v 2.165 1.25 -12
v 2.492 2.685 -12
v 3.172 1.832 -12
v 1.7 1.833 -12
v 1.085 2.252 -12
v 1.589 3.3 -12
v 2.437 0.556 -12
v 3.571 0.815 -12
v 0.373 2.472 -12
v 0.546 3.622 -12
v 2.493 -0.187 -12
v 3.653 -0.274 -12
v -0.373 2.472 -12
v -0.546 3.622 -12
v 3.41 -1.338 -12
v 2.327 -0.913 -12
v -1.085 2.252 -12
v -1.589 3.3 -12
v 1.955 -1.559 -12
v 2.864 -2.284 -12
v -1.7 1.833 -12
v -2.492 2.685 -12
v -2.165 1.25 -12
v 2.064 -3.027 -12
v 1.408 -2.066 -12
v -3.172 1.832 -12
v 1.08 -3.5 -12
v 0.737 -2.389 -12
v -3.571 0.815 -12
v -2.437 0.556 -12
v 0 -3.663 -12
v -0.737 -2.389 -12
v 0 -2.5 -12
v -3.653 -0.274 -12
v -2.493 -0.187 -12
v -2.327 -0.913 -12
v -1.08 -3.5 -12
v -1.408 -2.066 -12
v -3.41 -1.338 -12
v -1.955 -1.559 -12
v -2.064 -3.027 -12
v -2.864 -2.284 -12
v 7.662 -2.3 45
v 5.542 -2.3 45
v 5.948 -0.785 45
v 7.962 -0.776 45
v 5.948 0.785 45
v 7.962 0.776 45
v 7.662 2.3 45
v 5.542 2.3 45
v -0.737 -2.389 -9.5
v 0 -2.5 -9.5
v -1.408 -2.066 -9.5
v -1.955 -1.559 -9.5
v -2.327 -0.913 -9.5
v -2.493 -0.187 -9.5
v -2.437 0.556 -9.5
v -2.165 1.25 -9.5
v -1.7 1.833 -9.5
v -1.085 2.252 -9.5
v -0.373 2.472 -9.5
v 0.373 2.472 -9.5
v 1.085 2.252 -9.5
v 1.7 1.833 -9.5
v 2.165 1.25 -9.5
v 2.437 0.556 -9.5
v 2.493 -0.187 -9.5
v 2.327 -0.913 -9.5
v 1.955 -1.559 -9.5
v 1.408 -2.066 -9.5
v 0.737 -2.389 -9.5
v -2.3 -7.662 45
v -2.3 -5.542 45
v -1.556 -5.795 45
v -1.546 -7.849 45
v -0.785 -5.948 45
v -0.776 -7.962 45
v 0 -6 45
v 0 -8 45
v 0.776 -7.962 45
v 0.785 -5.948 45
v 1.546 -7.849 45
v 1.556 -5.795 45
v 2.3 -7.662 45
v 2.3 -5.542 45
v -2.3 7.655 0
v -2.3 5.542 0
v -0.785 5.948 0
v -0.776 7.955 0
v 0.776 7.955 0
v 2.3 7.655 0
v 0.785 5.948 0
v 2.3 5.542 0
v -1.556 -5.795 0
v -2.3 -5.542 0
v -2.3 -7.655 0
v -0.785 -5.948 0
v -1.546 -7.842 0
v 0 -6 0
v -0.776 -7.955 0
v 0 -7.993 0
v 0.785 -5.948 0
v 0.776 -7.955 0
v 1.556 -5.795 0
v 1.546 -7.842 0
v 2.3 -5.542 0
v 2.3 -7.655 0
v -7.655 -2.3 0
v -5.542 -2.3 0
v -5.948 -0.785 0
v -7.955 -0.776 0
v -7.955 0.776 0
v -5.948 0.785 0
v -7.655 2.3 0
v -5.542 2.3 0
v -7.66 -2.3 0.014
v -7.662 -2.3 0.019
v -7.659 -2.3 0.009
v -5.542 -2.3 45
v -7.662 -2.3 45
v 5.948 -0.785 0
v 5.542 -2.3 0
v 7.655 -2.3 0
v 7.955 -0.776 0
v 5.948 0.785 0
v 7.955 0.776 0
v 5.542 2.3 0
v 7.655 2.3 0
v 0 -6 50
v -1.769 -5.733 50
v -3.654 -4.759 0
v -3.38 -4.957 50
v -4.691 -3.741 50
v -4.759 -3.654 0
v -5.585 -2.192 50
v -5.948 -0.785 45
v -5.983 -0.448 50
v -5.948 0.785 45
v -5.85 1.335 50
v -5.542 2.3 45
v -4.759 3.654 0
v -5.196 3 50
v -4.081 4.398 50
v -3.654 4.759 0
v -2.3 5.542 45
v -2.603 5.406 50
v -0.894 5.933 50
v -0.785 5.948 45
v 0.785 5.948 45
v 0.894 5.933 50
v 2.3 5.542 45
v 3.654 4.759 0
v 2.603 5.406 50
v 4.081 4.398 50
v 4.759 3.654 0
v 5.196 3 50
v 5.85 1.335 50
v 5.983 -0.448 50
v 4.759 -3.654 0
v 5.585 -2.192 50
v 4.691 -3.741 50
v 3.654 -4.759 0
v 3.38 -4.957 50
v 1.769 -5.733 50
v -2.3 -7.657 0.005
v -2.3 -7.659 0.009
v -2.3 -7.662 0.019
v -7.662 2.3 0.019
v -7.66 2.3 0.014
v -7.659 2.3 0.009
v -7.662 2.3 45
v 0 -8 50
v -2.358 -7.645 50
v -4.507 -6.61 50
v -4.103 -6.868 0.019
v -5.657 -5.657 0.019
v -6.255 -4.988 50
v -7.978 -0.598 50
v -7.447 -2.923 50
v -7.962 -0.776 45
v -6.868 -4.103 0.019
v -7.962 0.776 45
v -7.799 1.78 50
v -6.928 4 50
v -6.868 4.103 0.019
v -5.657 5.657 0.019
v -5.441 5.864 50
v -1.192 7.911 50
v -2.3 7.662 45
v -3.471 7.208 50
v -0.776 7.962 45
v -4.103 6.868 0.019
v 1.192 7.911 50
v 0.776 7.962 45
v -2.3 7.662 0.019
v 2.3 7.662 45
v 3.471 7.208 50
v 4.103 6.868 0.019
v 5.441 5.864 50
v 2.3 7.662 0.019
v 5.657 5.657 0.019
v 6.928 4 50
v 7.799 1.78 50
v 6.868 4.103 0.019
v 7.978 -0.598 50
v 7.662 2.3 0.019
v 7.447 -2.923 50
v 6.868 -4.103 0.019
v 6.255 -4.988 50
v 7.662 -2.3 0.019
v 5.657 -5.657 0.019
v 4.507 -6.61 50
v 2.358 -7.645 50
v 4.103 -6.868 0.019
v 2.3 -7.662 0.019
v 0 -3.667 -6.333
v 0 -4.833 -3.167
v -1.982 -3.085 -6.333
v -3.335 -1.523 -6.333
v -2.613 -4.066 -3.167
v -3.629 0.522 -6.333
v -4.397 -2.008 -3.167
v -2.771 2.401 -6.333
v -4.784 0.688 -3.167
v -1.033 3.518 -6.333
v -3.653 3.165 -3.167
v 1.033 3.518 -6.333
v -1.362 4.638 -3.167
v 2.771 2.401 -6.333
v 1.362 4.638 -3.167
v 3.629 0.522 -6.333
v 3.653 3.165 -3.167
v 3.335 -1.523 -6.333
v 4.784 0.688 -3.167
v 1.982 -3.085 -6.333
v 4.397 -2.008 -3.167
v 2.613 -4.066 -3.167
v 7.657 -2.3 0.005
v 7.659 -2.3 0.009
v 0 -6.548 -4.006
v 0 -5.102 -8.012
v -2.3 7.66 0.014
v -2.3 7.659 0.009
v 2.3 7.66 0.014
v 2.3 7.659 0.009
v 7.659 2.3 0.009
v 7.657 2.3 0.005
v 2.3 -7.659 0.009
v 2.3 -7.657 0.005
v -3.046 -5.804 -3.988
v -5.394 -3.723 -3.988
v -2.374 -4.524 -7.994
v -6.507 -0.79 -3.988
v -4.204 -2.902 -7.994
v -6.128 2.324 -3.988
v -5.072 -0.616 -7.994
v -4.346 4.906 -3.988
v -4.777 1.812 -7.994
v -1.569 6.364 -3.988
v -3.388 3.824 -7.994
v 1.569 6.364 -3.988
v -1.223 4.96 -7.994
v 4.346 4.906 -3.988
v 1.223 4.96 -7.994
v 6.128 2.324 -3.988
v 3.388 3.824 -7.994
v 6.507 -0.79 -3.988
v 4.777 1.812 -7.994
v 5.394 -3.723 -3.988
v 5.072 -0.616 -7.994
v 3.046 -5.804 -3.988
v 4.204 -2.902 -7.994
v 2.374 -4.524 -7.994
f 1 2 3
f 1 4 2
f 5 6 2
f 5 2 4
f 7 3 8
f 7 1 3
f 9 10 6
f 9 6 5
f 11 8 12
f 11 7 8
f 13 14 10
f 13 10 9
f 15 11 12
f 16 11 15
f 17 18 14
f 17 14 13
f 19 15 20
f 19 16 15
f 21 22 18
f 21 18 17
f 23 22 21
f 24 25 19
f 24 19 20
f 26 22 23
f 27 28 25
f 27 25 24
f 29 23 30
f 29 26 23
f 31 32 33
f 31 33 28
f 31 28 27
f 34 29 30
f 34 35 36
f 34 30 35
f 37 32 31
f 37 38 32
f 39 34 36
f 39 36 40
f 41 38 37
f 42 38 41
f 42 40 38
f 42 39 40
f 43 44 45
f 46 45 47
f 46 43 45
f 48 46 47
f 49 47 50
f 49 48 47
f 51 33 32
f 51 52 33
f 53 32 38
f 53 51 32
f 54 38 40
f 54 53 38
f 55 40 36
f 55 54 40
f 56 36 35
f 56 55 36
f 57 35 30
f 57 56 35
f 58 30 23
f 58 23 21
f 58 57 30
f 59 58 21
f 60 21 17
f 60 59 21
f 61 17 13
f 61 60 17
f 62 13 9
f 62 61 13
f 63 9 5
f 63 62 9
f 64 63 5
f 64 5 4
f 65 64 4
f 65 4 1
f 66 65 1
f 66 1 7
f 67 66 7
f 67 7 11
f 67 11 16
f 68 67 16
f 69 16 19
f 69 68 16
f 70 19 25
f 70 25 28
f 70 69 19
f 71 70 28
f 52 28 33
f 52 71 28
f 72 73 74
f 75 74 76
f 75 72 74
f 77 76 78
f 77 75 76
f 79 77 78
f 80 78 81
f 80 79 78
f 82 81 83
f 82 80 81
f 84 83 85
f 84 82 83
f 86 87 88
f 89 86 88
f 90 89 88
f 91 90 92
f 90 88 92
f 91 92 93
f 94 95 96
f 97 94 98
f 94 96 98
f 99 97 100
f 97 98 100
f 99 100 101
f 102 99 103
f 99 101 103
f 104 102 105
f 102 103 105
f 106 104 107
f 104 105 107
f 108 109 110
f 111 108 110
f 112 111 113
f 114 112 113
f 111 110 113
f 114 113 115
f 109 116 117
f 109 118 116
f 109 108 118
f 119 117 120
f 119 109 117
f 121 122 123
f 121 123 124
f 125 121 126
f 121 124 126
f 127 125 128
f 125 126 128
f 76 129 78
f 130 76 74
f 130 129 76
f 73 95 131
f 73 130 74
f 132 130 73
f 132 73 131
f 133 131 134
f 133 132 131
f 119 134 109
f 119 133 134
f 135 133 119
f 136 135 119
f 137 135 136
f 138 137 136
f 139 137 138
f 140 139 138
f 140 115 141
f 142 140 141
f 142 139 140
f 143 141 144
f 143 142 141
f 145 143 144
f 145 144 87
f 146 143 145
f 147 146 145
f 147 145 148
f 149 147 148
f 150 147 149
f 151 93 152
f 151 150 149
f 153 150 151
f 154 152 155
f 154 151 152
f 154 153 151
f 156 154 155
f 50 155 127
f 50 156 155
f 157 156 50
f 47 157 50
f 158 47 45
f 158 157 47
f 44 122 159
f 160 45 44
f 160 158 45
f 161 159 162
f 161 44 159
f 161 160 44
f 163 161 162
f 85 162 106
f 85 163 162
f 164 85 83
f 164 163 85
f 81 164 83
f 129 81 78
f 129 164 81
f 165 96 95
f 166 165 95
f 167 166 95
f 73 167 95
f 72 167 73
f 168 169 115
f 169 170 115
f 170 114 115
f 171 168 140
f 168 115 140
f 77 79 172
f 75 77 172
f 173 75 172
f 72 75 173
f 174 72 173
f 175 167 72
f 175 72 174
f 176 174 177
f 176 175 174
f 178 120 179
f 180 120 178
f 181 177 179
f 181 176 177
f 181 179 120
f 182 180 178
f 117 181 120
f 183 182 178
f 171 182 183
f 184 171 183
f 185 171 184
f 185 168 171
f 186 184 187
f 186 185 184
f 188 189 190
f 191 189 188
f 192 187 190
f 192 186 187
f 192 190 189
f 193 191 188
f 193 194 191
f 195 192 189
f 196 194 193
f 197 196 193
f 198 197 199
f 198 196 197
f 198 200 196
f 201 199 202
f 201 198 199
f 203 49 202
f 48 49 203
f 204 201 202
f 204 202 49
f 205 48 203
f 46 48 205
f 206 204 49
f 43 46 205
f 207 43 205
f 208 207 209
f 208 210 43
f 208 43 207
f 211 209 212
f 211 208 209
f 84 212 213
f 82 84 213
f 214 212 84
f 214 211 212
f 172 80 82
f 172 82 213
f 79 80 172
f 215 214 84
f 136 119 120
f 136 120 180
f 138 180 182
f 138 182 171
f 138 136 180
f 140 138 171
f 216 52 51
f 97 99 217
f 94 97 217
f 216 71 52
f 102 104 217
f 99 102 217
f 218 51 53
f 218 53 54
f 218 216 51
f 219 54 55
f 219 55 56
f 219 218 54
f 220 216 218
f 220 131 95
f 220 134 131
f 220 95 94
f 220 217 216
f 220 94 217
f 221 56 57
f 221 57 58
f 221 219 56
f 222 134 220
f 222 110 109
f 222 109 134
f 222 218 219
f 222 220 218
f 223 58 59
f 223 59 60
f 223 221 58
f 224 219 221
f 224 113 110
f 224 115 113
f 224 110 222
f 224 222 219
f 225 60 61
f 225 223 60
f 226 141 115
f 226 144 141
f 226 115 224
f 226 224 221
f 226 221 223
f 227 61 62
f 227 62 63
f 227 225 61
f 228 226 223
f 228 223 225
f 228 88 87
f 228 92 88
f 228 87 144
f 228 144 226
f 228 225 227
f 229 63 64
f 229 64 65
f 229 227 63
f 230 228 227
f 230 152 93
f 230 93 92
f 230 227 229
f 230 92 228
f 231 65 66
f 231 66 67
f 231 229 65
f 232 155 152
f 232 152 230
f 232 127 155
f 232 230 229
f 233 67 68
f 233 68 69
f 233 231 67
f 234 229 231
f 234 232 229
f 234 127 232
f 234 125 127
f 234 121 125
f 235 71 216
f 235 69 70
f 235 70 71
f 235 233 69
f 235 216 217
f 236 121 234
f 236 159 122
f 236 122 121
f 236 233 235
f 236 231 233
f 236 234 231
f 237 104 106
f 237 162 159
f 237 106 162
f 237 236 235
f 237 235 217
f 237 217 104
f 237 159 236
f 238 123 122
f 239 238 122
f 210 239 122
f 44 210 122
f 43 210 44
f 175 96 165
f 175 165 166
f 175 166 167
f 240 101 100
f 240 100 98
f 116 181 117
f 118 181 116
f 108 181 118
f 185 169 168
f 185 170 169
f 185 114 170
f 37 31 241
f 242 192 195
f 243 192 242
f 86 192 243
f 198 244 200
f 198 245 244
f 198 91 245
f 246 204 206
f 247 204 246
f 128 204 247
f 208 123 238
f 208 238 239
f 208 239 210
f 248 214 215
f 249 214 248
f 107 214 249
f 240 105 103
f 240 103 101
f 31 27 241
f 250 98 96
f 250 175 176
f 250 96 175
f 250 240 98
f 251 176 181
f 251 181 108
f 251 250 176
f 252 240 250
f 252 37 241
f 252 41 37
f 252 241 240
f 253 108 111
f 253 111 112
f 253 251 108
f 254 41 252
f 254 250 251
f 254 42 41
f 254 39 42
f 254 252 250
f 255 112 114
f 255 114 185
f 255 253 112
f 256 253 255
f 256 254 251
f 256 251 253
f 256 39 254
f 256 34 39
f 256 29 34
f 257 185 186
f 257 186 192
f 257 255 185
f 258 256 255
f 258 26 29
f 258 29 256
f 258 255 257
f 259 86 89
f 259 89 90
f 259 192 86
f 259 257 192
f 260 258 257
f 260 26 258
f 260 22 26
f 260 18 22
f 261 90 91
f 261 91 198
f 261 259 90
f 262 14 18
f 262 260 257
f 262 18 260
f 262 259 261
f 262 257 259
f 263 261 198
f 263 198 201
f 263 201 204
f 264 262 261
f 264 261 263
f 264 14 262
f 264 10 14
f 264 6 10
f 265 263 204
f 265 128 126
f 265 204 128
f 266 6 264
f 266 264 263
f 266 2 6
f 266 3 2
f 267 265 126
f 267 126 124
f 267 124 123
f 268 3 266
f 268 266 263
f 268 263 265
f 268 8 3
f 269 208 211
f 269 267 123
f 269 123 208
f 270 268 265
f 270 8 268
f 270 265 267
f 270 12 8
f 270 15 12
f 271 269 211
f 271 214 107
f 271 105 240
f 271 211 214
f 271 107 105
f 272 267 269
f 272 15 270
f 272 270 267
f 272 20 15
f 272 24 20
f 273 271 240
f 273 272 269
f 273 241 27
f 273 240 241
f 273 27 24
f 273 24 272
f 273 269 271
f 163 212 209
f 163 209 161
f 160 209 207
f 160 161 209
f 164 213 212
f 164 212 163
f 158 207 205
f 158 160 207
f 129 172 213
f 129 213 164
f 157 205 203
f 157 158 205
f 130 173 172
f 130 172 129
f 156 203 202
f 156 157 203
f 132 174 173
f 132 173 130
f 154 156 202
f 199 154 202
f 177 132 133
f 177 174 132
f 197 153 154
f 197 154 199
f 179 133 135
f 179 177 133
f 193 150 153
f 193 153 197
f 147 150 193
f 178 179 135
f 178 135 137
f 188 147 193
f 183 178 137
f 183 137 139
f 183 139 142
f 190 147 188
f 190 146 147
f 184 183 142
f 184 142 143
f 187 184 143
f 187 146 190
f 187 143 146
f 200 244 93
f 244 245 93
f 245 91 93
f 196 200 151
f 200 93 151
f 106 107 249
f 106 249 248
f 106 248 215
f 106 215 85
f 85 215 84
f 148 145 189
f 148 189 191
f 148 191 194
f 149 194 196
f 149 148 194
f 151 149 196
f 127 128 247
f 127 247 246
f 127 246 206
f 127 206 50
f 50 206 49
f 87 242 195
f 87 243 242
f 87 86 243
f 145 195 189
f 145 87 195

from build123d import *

# Parameters (mm, degrees)
F2_W     = 4.6
F2_H     = 45
F3_DEPTH = 12.5
F4_W     = 4.6
F4_H     = 45
F5_DEPTH = 12.5


with BuildPart() as f1:
    # F0 (on Right) → F1 (revolve)
    with BuildSketch(Plane.YZ):
        Polygon((-6, 0), (-6, 50), (-8, 50), (-8, 0.018575), (-3.663243, -12), (-2.5, -12), (-2.5, -9.5), align=None)
    revolve(axis=Axis((0, 0, 4.996806), (0, 0, -1)))

    # F2 (on Front) → F3 (cut, symmetric)
    with BuildSketch(Plane.XZ):
        with Locations((0, 22.5)):
            Rectangle(F2_W, F2_H)
    extrude(amount=F3_DEPTH, both=True, mode=Mode.SUBTRACT)

    # F4 (on Right) → F5 (cut, symmetric)
    with BuildSketch(Plane.YZ):
        with Locations((0, 22.5)):
            Rectangle(F4_W, F4_H)
    extrude(amount=F5_DEPTH, both=True, mode=Mode.SUBTRACT)


solid = f1.part
